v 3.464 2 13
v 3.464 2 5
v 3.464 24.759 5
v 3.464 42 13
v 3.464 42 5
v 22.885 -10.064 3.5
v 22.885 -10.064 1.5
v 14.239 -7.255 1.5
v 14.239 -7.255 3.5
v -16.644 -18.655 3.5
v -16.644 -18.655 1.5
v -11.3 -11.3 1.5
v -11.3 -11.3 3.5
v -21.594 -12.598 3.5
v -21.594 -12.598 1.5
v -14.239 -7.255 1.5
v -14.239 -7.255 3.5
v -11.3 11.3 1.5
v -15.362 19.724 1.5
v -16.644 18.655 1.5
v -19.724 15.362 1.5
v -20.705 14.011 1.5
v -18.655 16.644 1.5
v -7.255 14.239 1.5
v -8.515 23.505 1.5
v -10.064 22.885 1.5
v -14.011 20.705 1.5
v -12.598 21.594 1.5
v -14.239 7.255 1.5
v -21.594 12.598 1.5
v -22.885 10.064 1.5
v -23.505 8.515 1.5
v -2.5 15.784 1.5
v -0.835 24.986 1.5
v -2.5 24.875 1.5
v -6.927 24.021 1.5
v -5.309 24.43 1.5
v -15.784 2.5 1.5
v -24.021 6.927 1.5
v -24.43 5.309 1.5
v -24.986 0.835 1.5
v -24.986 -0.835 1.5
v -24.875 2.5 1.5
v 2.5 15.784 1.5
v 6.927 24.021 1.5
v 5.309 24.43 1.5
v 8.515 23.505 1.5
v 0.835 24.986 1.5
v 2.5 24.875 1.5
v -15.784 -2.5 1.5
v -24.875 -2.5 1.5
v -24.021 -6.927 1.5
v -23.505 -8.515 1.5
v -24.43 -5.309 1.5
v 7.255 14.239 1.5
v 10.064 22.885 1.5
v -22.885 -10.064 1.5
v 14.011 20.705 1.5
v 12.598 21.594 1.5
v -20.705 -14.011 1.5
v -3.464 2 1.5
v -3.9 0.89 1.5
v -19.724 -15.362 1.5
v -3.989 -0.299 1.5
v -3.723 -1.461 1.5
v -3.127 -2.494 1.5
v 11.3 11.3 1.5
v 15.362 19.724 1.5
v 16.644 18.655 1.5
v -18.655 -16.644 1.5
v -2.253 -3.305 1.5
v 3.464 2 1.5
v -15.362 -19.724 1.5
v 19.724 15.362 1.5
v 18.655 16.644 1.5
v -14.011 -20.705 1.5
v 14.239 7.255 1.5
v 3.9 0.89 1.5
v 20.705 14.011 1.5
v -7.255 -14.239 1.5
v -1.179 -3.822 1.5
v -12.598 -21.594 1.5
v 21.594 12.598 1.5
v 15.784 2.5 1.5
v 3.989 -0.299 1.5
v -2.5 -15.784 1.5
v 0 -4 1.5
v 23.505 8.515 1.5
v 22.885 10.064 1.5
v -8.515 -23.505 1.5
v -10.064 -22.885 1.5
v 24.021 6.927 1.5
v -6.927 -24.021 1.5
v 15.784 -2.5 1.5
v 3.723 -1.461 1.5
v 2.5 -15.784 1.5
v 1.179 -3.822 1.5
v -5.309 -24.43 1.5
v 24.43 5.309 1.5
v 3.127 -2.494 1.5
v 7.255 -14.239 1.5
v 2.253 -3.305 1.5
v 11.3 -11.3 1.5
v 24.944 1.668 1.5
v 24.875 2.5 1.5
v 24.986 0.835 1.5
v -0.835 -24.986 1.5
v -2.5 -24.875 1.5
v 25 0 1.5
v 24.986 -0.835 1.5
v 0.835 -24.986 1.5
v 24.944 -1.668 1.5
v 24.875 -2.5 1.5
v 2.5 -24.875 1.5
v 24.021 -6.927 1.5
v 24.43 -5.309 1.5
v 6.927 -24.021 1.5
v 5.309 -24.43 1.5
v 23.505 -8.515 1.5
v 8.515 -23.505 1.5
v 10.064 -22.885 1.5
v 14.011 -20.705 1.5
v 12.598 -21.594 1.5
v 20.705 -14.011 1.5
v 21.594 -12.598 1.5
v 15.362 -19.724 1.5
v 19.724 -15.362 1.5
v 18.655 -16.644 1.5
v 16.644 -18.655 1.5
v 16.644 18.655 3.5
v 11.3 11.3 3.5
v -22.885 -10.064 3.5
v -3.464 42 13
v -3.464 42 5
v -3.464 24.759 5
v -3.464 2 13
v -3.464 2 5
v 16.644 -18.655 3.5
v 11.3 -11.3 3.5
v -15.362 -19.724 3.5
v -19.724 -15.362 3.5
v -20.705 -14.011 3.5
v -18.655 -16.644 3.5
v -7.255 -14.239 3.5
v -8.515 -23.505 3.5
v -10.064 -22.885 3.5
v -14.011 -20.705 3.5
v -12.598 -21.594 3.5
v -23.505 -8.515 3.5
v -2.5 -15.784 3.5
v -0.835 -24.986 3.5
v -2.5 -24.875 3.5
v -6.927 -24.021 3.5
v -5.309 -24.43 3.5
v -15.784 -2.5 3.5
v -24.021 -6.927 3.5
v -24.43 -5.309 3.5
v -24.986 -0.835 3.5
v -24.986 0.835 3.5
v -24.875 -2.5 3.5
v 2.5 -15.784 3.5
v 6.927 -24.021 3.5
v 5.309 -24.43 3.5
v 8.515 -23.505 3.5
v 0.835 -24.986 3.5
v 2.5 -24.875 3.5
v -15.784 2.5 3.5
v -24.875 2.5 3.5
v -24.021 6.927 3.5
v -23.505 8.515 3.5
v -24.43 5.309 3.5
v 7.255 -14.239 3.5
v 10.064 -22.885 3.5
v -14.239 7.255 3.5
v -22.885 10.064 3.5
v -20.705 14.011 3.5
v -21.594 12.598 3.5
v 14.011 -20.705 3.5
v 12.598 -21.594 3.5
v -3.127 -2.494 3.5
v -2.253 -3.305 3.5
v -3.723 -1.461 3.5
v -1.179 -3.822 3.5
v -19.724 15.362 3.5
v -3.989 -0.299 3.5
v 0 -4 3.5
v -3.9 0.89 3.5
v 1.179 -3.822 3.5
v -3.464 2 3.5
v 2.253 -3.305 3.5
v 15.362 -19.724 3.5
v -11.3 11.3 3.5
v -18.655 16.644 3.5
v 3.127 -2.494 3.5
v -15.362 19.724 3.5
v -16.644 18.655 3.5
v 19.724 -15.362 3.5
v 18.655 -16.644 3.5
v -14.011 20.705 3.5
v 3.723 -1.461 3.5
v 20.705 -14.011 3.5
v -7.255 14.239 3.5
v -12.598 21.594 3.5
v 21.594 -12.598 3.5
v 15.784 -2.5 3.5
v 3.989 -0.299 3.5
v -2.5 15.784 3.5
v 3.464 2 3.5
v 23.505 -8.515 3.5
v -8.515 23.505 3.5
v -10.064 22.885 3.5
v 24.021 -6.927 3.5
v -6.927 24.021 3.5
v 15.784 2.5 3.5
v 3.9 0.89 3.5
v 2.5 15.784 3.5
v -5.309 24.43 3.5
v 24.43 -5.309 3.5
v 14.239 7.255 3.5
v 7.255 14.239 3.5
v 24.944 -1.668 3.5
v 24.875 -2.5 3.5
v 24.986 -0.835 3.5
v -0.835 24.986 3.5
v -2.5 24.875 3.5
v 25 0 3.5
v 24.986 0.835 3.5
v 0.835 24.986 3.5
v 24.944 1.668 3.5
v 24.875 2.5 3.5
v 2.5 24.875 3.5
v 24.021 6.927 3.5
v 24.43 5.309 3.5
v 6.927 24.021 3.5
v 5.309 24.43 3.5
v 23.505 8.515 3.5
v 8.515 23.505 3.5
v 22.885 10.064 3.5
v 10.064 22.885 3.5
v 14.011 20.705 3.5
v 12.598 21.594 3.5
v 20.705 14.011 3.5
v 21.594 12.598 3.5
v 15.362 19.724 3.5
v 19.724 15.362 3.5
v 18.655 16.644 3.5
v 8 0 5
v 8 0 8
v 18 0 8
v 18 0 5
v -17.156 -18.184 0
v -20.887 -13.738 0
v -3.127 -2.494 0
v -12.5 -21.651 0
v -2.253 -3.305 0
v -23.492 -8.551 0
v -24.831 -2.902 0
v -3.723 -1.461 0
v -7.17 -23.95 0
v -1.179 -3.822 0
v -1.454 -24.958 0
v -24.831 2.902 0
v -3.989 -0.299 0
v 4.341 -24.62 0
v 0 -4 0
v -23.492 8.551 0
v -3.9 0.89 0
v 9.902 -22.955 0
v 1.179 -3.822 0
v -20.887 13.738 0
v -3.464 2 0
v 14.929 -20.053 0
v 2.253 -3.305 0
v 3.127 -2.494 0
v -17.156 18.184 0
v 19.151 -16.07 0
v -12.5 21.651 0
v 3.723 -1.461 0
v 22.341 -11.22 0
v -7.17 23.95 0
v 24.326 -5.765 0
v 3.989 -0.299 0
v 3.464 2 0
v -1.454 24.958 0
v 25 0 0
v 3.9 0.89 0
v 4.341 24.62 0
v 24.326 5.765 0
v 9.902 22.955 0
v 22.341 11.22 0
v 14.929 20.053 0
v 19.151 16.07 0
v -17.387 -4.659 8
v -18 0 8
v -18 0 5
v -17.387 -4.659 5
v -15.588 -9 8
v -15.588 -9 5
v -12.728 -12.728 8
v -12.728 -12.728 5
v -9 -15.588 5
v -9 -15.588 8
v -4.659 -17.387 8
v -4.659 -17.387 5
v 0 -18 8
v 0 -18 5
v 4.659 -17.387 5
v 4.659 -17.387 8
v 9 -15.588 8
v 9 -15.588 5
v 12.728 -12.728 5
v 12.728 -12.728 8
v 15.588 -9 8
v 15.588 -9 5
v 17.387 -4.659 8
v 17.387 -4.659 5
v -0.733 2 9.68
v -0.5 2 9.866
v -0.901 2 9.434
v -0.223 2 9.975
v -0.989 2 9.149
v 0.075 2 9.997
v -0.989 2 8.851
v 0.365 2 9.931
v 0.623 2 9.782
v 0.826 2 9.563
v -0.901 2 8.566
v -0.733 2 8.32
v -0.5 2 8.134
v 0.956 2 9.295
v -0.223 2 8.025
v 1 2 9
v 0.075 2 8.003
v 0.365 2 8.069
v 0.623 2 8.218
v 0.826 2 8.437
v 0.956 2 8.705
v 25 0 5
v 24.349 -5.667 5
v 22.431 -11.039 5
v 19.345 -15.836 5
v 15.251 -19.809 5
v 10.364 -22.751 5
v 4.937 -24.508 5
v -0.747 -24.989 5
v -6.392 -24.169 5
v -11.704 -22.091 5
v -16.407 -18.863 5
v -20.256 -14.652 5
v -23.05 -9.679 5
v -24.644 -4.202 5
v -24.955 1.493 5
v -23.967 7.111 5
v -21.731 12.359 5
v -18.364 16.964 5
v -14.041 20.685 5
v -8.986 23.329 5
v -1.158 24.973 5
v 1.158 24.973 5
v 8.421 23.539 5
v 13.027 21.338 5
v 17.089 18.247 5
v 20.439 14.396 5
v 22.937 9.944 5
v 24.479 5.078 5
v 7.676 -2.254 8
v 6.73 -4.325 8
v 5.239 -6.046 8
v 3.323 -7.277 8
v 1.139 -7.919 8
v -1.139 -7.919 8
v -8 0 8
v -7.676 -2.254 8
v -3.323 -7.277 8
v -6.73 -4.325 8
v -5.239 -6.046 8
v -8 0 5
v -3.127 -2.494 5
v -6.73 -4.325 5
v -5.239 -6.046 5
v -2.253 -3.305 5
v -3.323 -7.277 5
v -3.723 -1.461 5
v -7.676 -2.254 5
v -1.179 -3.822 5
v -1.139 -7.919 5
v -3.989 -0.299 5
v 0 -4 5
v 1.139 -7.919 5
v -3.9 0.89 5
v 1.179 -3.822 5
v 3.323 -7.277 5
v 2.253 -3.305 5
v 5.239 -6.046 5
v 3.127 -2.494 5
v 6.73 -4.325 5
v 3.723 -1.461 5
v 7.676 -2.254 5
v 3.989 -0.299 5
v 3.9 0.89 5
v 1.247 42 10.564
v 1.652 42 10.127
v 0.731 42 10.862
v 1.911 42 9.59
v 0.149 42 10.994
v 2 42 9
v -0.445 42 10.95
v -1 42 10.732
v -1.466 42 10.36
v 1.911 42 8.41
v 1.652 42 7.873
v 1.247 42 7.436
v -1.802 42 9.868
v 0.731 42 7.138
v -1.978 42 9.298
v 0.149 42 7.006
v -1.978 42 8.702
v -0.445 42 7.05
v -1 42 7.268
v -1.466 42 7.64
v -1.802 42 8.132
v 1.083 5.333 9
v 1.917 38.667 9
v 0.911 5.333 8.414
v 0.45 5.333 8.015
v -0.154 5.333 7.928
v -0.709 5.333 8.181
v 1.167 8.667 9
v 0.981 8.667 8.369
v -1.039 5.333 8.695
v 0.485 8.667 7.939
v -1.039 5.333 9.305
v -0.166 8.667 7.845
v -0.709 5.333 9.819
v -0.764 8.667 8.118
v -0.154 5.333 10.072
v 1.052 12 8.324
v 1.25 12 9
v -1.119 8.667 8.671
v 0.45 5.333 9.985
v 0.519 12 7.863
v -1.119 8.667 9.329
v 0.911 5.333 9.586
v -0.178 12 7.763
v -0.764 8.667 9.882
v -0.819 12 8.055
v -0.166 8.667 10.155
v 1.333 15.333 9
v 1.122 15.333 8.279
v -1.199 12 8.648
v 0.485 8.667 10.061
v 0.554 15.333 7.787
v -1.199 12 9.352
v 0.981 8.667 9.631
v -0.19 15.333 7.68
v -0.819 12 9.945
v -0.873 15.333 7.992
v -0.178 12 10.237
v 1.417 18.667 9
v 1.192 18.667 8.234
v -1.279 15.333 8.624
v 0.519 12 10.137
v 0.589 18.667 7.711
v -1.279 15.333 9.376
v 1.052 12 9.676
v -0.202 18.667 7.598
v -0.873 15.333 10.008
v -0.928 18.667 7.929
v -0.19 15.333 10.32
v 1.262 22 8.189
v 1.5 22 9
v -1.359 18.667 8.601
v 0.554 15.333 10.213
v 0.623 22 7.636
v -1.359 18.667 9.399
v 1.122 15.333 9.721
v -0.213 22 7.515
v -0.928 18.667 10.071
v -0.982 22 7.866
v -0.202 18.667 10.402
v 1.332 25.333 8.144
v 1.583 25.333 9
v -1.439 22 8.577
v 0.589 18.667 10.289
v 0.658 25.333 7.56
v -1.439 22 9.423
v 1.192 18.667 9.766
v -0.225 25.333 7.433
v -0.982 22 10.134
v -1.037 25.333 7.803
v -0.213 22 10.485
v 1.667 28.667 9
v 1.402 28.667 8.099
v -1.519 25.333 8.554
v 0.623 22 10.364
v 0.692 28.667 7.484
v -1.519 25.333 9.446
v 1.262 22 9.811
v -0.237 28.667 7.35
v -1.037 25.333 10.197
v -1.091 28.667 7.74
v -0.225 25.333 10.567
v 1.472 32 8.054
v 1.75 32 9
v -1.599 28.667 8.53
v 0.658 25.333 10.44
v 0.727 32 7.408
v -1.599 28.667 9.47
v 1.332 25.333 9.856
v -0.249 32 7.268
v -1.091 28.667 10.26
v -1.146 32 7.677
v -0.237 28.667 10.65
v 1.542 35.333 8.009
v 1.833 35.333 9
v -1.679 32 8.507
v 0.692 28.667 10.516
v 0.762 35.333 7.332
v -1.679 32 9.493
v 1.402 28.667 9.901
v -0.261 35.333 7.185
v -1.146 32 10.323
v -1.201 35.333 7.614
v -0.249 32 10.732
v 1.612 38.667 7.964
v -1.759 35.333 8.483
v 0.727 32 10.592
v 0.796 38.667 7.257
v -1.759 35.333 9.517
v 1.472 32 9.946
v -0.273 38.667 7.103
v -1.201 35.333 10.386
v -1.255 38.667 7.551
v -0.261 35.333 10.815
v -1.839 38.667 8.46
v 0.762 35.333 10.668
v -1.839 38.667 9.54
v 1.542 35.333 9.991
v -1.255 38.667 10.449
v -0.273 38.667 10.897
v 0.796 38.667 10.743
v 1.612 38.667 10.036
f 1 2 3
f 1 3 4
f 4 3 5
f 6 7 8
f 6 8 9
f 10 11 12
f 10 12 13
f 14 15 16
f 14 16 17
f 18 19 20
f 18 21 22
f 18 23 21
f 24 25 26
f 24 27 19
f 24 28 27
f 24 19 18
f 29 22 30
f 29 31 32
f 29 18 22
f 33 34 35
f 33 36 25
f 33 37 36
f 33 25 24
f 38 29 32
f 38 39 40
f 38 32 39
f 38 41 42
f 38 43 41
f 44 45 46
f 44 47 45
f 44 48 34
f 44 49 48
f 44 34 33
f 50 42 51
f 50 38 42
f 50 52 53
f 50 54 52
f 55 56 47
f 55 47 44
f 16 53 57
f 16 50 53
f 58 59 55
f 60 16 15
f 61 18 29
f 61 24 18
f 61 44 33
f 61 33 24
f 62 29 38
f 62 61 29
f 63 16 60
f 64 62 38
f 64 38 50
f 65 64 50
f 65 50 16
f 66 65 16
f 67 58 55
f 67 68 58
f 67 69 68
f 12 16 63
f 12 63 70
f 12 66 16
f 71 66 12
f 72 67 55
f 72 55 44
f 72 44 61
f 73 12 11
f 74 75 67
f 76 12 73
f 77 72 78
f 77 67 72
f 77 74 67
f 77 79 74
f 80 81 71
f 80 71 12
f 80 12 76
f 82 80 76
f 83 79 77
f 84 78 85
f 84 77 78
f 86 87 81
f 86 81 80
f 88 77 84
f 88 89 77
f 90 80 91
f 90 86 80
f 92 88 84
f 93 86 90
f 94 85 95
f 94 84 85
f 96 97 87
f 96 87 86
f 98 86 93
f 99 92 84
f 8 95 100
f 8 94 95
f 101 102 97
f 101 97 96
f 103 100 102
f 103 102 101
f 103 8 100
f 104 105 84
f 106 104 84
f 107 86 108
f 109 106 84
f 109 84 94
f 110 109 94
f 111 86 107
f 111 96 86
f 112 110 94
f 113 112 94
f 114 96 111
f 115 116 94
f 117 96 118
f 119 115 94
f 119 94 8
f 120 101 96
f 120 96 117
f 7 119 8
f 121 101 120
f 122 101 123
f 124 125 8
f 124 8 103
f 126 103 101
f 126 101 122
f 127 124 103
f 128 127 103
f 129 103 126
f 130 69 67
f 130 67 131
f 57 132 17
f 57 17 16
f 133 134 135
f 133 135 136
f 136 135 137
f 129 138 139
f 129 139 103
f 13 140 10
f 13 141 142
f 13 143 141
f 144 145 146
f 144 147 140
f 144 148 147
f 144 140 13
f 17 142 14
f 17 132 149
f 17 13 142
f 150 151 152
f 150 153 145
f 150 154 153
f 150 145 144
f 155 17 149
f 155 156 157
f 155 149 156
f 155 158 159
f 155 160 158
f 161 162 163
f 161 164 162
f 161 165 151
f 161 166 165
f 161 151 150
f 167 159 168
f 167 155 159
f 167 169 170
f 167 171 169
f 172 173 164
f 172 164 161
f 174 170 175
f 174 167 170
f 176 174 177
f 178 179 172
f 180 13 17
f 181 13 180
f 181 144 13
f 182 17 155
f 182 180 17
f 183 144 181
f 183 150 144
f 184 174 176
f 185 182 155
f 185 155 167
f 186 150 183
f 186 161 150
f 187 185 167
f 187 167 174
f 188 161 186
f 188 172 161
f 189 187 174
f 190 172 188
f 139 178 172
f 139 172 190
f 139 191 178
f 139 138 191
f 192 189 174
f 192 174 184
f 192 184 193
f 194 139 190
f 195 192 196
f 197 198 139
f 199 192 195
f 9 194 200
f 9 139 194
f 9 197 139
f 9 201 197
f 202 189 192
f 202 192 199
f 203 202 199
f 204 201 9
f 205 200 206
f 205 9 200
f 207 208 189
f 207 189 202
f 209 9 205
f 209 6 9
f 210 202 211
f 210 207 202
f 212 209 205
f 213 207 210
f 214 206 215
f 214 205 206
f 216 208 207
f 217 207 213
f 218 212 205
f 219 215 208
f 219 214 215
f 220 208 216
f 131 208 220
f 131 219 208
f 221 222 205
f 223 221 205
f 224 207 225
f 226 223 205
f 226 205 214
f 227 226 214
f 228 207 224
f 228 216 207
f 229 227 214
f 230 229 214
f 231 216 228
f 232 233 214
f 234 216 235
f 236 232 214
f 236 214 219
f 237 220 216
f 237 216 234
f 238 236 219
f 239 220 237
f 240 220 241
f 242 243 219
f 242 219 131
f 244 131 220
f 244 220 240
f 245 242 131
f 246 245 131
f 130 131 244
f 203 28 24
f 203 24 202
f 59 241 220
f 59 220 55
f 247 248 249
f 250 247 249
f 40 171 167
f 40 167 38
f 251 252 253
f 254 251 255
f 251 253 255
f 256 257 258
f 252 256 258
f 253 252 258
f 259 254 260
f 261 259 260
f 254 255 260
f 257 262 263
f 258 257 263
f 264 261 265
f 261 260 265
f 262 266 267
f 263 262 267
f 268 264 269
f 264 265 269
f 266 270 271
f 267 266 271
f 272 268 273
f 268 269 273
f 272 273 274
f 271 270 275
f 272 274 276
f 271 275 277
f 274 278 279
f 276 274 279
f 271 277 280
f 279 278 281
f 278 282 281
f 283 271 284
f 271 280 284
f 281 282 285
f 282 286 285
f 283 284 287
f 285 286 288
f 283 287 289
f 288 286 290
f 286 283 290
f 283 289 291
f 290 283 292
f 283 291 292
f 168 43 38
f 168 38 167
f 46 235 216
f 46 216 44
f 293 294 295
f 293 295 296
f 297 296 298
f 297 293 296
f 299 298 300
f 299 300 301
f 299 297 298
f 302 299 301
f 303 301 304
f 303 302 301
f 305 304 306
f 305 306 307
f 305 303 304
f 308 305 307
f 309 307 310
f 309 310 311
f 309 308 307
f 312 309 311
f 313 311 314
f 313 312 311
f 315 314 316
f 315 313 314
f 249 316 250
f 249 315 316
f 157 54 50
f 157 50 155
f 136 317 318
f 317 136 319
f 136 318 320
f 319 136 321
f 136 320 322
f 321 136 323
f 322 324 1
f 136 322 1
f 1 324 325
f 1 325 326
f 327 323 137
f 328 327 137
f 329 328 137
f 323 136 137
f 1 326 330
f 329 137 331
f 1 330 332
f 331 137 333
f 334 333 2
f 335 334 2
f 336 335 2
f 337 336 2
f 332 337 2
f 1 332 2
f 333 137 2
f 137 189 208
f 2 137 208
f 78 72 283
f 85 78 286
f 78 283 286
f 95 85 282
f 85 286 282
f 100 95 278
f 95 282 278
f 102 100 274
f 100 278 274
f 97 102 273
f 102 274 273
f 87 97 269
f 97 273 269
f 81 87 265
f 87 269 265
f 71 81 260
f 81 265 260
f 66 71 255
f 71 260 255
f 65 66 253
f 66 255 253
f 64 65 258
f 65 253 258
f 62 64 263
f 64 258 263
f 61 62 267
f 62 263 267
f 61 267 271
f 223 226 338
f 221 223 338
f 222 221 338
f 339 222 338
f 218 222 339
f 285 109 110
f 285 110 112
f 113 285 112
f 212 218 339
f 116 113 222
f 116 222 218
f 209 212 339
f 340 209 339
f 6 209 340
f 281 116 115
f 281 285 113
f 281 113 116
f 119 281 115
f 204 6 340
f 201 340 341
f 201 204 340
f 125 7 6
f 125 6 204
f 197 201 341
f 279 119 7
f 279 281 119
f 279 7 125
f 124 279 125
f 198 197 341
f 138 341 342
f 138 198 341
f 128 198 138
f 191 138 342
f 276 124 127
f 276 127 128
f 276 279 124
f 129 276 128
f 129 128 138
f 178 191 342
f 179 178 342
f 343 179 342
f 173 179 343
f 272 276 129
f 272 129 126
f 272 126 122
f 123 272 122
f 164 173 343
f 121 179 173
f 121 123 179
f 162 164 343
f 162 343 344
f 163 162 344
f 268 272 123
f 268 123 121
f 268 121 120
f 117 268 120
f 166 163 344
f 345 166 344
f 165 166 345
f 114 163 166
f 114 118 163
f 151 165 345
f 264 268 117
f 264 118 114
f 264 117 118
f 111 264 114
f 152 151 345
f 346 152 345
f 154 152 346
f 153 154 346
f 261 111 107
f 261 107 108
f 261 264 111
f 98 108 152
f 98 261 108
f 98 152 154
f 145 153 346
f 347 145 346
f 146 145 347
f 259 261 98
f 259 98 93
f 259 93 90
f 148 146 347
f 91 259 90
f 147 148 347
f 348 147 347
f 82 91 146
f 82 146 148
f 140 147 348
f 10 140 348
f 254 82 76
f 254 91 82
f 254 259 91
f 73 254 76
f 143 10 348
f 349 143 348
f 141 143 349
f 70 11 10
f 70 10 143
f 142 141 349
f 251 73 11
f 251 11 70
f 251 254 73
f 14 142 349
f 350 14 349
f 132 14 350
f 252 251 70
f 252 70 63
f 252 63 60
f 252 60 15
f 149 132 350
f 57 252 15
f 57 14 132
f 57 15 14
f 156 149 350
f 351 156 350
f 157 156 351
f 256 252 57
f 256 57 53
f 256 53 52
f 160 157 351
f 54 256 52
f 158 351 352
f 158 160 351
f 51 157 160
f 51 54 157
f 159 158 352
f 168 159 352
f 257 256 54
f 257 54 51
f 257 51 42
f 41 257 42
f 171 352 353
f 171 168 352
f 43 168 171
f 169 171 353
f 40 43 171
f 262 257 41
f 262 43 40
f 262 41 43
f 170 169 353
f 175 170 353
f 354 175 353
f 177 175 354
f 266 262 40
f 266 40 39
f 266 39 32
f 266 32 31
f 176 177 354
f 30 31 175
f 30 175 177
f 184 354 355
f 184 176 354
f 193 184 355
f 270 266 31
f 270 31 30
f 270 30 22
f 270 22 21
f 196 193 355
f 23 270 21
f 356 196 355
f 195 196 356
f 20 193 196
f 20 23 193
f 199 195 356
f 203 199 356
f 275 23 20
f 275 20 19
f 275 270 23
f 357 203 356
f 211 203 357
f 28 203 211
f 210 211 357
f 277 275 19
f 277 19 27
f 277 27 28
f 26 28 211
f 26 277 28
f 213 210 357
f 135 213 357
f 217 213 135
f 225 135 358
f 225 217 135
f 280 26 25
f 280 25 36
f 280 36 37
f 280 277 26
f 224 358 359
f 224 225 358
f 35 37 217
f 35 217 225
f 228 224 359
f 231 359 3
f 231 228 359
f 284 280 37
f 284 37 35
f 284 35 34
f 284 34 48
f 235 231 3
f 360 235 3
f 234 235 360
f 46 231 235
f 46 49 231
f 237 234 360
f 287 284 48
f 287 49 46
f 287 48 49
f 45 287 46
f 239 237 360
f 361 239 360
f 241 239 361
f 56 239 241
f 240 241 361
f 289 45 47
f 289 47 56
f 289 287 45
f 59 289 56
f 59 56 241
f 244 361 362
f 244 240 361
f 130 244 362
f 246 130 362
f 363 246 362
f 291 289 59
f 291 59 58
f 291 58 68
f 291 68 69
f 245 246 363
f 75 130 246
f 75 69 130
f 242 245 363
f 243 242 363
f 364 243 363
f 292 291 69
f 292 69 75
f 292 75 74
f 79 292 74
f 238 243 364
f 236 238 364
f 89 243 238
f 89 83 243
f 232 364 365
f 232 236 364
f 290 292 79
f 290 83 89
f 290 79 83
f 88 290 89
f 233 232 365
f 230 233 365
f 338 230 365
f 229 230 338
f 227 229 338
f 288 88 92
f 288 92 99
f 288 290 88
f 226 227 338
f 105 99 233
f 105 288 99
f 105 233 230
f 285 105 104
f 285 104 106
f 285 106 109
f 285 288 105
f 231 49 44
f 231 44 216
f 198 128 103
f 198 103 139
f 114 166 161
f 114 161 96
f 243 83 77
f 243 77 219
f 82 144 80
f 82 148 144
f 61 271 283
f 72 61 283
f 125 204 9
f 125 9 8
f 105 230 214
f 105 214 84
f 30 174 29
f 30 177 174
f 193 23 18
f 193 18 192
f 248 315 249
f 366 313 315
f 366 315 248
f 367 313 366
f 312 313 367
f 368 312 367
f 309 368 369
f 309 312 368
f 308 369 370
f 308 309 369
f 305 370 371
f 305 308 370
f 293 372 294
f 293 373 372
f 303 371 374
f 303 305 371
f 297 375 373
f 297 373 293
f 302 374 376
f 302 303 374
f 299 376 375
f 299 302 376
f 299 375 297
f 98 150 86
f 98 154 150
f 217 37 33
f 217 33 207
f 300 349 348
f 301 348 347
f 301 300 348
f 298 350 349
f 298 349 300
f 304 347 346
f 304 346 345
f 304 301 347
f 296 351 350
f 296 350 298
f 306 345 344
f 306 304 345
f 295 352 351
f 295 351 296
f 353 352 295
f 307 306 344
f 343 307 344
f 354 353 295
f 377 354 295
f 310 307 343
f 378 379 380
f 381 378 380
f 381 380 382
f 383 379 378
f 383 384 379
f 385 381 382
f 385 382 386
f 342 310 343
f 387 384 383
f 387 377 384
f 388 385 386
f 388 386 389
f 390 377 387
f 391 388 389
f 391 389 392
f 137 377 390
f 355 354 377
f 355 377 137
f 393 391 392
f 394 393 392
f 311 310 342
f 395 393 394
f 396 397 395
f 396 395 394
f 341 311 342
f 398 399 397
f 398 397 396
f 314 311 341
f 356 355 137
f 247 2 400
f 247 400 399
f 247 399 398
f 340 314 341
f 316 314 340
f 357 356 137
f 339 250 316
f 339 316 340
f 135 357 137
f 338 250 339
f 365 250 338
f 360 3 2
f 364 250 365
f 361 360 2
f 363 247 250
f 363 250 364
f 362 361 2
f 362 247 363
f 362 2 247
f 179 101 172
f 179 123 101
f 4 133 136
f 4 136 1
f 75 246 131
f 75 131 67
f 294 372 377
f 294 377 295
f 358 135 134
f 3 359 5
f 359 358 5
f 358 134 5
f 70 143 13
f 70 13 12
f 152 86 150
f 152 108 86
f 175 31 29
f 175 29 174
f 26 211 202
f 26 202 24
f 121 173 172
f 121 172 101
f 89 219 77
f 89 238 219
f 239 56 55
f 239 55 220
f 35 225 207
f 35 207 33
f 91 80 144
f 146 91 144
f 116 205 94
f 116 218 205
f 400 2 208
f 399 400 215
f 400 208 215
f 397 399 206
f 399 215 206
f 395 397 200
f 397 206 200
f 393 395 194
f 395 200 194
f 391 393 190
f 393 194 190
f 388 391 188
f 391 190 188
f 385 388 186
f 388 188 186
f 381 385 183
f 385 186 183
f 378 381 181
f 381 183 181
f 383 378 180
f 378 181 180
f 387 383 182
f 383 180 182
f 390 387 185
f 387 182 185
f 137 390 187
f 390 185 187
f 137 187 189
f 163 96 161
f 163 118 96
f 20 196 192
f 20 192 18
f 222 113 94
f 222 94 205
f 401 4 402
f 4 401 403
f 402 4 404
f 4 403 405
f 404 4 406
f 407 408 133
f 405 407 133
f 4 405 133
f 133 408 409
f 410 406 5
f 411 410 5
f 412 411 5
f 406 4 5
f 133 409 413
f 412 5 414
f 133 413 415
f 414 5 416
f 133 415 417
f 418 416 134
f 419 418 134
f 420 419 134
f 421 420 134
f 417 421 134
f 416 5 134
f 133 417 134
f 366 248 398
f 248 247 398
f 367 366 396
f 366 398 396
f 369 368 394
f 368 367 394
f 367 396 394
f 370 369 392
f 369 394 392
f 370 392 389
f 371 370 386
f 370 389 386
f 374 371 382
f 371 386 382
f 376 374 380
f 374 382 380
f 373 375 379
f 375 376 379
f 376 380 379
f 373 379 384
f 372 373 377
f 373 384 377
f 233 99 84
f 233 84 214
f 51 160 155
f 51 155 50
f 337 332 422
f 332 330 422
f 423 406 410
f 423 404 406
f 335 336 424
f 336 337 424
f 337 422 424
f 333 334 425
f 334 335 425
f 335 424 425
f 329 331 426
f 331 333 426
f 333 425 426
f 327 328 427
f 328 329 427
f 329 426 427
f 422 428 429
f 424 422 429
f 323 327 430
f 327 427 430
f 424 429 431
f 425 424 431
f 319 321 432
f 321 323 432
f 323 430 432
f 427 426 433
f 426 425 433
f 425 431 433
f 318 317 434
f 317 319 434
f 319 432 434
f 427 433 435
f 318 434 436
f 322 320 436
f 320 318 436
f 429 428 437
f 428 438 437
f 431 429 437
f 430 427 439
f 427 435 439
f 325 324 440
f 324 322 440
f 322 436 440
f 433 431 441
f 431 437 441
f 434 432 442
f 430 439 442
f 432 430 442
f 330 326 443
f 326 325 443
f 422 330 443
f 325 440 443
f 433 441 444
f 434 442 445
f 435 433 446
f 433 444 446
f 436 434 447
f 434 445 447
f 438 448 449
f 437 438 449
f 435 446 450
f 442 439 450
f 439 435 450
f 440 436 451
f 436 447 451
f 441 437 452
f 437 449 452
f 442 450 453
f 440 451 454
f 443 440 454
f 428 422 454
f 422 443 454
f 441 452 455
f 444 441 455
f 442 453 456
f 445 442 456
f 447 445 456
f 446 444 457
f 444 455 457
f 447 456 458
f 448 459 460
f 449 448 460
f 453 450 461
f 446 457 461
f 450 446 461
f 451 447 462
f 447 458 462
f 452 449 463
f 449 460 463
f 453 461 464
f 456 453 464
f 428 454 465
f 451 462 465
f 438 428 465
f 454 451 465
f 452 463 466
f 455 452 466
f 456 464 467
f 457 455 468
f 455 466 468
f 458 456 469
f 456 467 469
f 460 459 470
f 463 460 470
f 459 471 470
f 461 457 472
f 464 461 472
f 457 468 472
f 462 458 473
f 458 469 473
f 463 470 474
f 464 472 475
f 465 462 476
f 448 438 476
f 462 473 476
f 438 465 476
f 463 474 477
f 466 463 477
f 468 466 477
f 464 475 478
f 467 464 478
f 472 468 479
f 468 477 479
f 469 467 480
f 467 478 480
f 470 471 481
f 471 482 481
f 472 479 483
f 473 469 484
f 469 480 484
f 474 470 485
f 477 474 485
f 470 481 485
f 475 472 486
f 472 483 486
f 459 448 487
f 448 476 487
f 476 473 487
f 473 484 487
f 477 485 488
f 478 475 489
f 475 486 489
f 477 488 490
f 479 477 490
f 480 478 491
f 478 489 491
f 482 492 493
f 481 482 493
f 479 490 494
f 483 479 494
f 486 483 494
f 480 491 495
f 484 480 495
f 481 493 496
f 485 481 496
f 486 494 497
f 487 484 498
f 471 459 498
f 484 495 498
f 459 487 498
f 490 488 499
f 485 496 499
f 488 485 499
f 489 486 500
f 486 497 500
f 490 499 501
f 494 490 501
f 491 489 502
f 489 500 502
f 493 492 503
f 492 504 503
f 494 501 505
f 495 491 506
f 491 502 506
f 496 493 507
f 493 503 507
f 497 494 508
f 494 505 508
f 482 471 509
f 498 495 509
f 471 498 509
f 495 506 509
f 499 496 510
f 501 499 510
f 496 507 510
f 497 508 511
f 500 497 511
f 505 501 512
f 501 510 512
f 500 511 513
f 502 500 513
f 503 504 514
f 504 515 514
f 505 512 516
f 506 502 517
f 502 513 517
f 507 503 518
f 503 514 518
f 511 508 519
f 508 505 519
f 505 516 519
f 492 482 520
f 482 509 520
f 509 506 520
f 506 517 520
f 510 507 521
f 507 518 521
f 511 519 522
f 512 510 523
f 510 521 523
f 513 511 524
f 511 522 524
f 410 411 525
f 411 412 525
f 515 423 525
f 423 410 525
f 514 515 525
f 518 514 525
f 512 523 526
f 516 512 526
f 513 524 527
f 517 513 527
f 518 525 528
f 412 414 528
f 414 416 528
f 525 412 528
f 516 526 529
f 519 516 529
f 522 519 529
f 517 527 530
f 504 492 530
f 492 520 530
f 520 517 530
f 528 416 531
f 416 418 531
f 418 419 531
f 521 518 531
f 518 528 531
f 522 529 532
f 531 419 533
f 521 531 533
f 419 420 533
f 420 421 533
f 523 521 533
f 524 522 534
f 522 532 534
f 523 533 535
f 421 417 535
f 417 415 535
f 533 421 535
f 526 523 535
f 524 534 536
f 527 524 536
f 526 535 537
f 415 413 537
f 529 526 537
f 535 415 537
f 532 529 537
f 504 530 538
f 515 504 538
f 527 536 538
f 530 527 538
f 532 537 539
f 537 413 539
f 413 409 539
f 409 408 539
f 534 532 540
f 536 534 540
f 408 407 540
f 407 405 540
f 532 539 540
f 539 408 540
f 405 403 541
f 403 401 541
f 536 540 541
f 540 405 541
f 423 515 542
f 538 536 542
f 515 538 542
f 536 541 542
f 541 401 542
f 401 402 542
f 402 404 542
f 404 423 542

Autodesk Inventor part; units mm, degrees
ref_plane "YZ Plane" through (0, 0, 0) normal (1, 0, 0) x (0, 1, 0)
ref_plane "XY Plane" through (0, 0, 0) normal (0, 0, 1) x (1, 0, 0)
sketch "Sketch1" plane through (0, 0, 0) normal (0, 0, 1) x (1, 0, 0)
  circle A0 centre (0, 0) radius 25
  circle A1 centre (0, 0) radius 4
  line L0 (-3.4641, 2) -> (3.4641, 2)
  dimension "d0" = 50
  dimension "d1" = 8
  dimension "d2" = 2
extrude "Extrusion1" add sketch "Sketch1" along normal blind 5 contours A0 | L0 A1 picked at (-0.1548, 2.6577)
ref_plane "Work Plane1" through (0, 25, 0) normal (0, 1, 0) x (-1, 0, 0)
sketch "Sketch3" plane through (0, 25, 0) normal (0, 1, 0) x (-1, 0, 0)
  line L0 (2.5, 1.5) -> (-2.5, 1.5)
  line L1 (-2.5, 1.5) -> (-2.5, 3.5)
  line L2 (-2.5, 3.5) -> (2.5, 3.5)
  line L3 (2.5, 3.5) -> (2.5, 1.5)
  line L4 (25, 0) -> (25, 5) construction
  point P0 (0, 0)
  point P1 (0, 1.5)
  point P2 (2.5, 2.5)
  point P3 (25, 2.5)
  dimension "d12" = 5
  dimension "d13" = 2
extrude "Extrusion2" cut sketch "Sketch3" against normal blind 25
pattern_circular "Circular Pattern1" count 20 over 360 about axis through (0, 0, -10) along (0, 0, 1) of "Extrusion2"
sketch "Sketch4" plane through (0, 0, 5) normal (0, 0, 1) x (1, 0, 0)
  line L0 (-3.4641, 2) -> (3.4641, 2) projected
  line L1 (-3.4641, 2) -> (3.4641, 2)
  line L2 (3.4641, 2) -> (3.4641, 42)
  line L3 (3.4641, 42) -> (-3.4641, 42)
  line L4 (-3.4641, 42) -> (-3.4641, 2)
  point P0 (0, 0)
  dimension "d19" = 40
  dimension "d20" = 6.9282
extrude "Extrusion3" add sketch "Sketch4" along normal blind 8
sketch "Sketch5" plane through (-3.4641, 42, 5) normal (0, 1, 0) x (1, 0, 0)
  circle A0 centre (3.4641, -4) radius 2
  line L0 (6.9282, 0) -> (0, 0) construction
  line L1 (0, 0) -> (0, -8) construction
  line L2 (6.9282, -8) -> (0, -8) construction
  line L3 (6.9282, 0) -> (6.9282, -8) construction
  point P0 (3.4641, 5)
  point P1 (6.9282, -4)
  point P2 (3.4641, -8)
  dimension "d23" = 4
sketch "Sketch6" plane through (-3.4641, 2, 3.5) normal (0, -1, 0) x (1, 0, 0)
  circle A0 centre (3.4641, 5.5) radius 1
  line L0 (0, 9.5) -> (6.9282, 9.5) projected
  line L1 (6.9282, 1.5) -> (6.9282, 9.5) projected
  point P0 (3.4641, -3.5)
  point P1 (3.4641, 9.5)
  point P2 (6.9282, 5.5)
  dimension "d24" = 2
loft "Loft1" cut profiles "Sketch5", "Sketch6"
sketch "Sketch7" plane through (0, 0, 0) normal (0, 1, 0) x (-1, 0, 0)
  line L0 (25, 5) -> (-25, 5) construction
  line L1 (8, 5) -> (18, 5)
  line L2 (18, 5) -> (18, 8)
  line L3 (18, 8) -> (8, 8)
  line L4 (8, 8) -> (8, 5)
  line L5 (-10.0643, 3.5) -> (-5.3091, 3.5) construction
  line L6 (-5.3091, 3.5) -> (-5.3091, 1.5) construction
  line L7 (-5.3091, 1.5) -> (-10.0643, 1.5) construction
  line L8 (-10.0643, 1.5) -> (-10.0643, 3.5) construction
  line L9 (-24.8747, 1.5) -> (-24.8747, 1.5) construction
  line L10 (-24.8747, 1.5) -> (-24.8747, 3.5) construction
  line L11 (-24.8747, 3.5) -> (-24.8747, 3.5) construction
  line L12 (-24.8747, 3.5) -> (-24.8747, 1.5) construction
  line L13 (-24.4298, 1.5) -> (-22.8847, 1.5) construction
  line L14 (-22.8847, 1.5) -> (-22.8847, 3.5) construction
  line L15 (-22.8847, 3.5) -> (-24.4298, 3.5) construction
  line L16 (-24.4298, 3.5) -> (-24.4298, 1.5) construction
  line L17 (-21.5935, 1.5) -> (-18.6546, 1.5) construction
  line L18 (-18.6546, 1.5) -> (-18.6546, 3.5) construction
  line L19 (-18.6546, 3.5) -> (-21.5935, 3.5) construction
  line L20 (-21.5935, 3.5) -> (-21.5935, 1.5) construction
  line L21 (-16.6435, 1.5) -> (-12.5984, 1.5) construction
  line L22 (-12.5984, 1.5) -> (-12.5984, 3.5) construction
  line L23 (-12.5984, 3.5) -> (-16.6435, 3.5) construction
  line L24 (-16.6435, 3.5) -> (-16.6435, 1.5) construction
  line L25 (-10.0643, 1.5) -> (-5.3091, 1.5) construction
  line L26 (-5.3091, 1.5) -> (-5.3091, 3.5) construction
  line L27 (-5.3091, 3.5) -> (-10.0643, 3.5) construction
  line L28 (-10.0643, 3.5) -> (-10.0643, 1.5) construction
  line L29 (10.0643, 1.5) -> (5.3091, 1.5) construction
  line L30 (5.3091, 1.5) -> (5.3091, 3.5) construction
  line L31 (5.3091, 3.5) -> (10.0643, 3.5) construction
  line L32 (10.0643, 3.5) -> (10.0643, 1.5) construction
  line L33 (-12.5984, 1.5) -> (-16.6435, 1.5) construction
  line L34 (-16.6435, 1.5) -> (-16.6435, 3.5) construction
  line L35 (-16.6435, 3.5) -> (-12.5984, 3.5) construction
  line L36 (-12.5984, 3.5) -> (-12.5984, 1.5) construction
  line L37 (-18.6546, 1.5) -> (-21.5935, 1.5) construction
  line L38 (-21.5935, 1.5) -> (-21.5935, 3.5) construction
  line L39 (-21.5935, 3.5) -> (-18.6546, 3.5) construction
  line L40 (-18.6546, 3.5) -> (-18.6546, 1.5) construction
  line L41 (-22.8847, 1.5) -> (-24.4298, 1.5) construction
  line L42 (-24.4298, 1.5) -> (-24.4298, 3.5) construction
  line L43 (-24.4298, 3.5) -> (-22.8847, 3.5) construction
  line L44 (-22.8847, 3.5) -> (-22.8847, 1.5) construction
  line L45 (12.5984, 3.5) -> (16.6435, 3.5) construction
  line L46 (16.6435, 3.5) -> (16.6435, 1.5) construction
  line L47 (16.6435, 1.5) -> (12.5984, 1.5) construction
  line L48 (12.5984, 1.5) -> (12.5984, 3.5) construction
  line L49 (18.6546, 3.5) -> (21.5935, 3.5) construction
  line L50 (21.5935, 3.5) -> (21.5935, 1.5) construction
  line L51 (21.5935, 1.5) -> (18.6546, 1.5) construction
  line L52 (18.6546, 1.5) -> (18.6546, 3.5) construction
  line L53 (22.8847, 3.5) -> (24.4298, 3.5) construction
  line L54 (24.4298, 3.5) -> (24.4298, 1.5) construction
  line L55 (24.4298, 1.5) -> (22.8847, 1.5) construction
  line L56 (22.8847, 1.5) -> (22.8847, 3.5) construction
  line L57 (24.8747, 3.5) -> (24.8747, 3.5) construction
  line L58 (24.8747, 3.5) -> (24.8747, 1.5) construction
  line L59 (24.8747, 1.5) -> (24.8747, 1.5) construction
  line L60 (24.8747, 1.5) -> (24.8747, 3.5) construction
  line L61 (24.4298, 3.5) -> (22.8847, 3.5) construction
  line L62 (22.8847, 3.5) -> (22.8847, 1.5) construction
  line L63 (22.8847, 1.5) -> (24.4298, 1.5) construction
  line L64 (24.4298, 1.5) -> (24.4298, 3.5) construction
  line L65 (21.5935, 3.5) -> (18.6546, 3.5) construction
  line L66 (18.6546, 3.5) -> (18.6546, 1.5) construction
  line L67 (18.6546, 1.5) -> (21.5935, 1.5) construction
  line L68 (21.5935, 1.5) -> (21.5935, 3.5) construction
  line L69 (16.6435, 3.5) -> (12.5984, 3.5) construction
  line L70 (12.5984, 3.5) -> (12.5984, 1.5) construction
  line L71 (12.5984, 1.5) -> (16.6435, 1.5) construction
  line L72 (16.6435, 1.5) -> (16.6435, 3.5) construction
  line L73 (10.0643, 3.5) -> (5.3091, 3.5) construction
  line L74 (5.3091, 3.5) -> (5.3091, 1.5) construction
  line L75 (5.3091, 1.5) -> (10.0643, 1.5) construction
  line L76 (10.0643, 1.5) -> (10.0643, 3.5) construction
  line L77 (2.5, 3.5) -> (-2.5, 3.5) construction
  line L78 (-2.5, 3.5) -> (-2.5, 1.5) construction
  line L79 (-2.5, 1.5) -> (2.5, 1.5) construction
  line L80 (2.5, 1.5) -> (2.5, 3.5) construction
  line L81 (-2.5, 3.5) -> (2.5, 3.5) construction
  line L82 (2.5, 3.5) -> (2.5, 1.5) construction
  line L83 (2.5, 1.5) -> (-2.5, 1.5) construction
  line L84 (-2.5, 1.5) -> (-2.5, 3.5) construction
  line L85 (3.4641, 5) -> (-3.4641, 5) construction
  line L86 (-3.4641, 5) -> (3.4641, 5) construction
  line L87 (-25, 0) -> (25, 0) construction
  circle A0 centre (0, 9) radius 1 construction
  line L88 (3.4641, 3.5) -> (-3.4641, 3.5) construction
  line L89 (-3.4641, 3.5) -> (-3.4641, 5) construction
  line L90 (-3.4641, 5) -> (-3.4641, 13) construction
  line L91 (3.4641, 13) -> (-3.4641, 13) construction
  line L92 (3.4641, 5) -> (3.4641, 13) construction
  line L93 (3.4641, 3.5) -> (3.4641, 5) construction
  line L94 (0, -2.6) -> (0, 15.6) projected
  point P0 (0, 0)
  dimension "d29" = 8
  dimension "d30" = 3
  dimension "d31" = 10
revolve "Revolution1" add sketch "Sketch7" angle 180 about axis through (0, 0, -10) along (0, 0, 1)
properties part number "Parcial3_Repo"
